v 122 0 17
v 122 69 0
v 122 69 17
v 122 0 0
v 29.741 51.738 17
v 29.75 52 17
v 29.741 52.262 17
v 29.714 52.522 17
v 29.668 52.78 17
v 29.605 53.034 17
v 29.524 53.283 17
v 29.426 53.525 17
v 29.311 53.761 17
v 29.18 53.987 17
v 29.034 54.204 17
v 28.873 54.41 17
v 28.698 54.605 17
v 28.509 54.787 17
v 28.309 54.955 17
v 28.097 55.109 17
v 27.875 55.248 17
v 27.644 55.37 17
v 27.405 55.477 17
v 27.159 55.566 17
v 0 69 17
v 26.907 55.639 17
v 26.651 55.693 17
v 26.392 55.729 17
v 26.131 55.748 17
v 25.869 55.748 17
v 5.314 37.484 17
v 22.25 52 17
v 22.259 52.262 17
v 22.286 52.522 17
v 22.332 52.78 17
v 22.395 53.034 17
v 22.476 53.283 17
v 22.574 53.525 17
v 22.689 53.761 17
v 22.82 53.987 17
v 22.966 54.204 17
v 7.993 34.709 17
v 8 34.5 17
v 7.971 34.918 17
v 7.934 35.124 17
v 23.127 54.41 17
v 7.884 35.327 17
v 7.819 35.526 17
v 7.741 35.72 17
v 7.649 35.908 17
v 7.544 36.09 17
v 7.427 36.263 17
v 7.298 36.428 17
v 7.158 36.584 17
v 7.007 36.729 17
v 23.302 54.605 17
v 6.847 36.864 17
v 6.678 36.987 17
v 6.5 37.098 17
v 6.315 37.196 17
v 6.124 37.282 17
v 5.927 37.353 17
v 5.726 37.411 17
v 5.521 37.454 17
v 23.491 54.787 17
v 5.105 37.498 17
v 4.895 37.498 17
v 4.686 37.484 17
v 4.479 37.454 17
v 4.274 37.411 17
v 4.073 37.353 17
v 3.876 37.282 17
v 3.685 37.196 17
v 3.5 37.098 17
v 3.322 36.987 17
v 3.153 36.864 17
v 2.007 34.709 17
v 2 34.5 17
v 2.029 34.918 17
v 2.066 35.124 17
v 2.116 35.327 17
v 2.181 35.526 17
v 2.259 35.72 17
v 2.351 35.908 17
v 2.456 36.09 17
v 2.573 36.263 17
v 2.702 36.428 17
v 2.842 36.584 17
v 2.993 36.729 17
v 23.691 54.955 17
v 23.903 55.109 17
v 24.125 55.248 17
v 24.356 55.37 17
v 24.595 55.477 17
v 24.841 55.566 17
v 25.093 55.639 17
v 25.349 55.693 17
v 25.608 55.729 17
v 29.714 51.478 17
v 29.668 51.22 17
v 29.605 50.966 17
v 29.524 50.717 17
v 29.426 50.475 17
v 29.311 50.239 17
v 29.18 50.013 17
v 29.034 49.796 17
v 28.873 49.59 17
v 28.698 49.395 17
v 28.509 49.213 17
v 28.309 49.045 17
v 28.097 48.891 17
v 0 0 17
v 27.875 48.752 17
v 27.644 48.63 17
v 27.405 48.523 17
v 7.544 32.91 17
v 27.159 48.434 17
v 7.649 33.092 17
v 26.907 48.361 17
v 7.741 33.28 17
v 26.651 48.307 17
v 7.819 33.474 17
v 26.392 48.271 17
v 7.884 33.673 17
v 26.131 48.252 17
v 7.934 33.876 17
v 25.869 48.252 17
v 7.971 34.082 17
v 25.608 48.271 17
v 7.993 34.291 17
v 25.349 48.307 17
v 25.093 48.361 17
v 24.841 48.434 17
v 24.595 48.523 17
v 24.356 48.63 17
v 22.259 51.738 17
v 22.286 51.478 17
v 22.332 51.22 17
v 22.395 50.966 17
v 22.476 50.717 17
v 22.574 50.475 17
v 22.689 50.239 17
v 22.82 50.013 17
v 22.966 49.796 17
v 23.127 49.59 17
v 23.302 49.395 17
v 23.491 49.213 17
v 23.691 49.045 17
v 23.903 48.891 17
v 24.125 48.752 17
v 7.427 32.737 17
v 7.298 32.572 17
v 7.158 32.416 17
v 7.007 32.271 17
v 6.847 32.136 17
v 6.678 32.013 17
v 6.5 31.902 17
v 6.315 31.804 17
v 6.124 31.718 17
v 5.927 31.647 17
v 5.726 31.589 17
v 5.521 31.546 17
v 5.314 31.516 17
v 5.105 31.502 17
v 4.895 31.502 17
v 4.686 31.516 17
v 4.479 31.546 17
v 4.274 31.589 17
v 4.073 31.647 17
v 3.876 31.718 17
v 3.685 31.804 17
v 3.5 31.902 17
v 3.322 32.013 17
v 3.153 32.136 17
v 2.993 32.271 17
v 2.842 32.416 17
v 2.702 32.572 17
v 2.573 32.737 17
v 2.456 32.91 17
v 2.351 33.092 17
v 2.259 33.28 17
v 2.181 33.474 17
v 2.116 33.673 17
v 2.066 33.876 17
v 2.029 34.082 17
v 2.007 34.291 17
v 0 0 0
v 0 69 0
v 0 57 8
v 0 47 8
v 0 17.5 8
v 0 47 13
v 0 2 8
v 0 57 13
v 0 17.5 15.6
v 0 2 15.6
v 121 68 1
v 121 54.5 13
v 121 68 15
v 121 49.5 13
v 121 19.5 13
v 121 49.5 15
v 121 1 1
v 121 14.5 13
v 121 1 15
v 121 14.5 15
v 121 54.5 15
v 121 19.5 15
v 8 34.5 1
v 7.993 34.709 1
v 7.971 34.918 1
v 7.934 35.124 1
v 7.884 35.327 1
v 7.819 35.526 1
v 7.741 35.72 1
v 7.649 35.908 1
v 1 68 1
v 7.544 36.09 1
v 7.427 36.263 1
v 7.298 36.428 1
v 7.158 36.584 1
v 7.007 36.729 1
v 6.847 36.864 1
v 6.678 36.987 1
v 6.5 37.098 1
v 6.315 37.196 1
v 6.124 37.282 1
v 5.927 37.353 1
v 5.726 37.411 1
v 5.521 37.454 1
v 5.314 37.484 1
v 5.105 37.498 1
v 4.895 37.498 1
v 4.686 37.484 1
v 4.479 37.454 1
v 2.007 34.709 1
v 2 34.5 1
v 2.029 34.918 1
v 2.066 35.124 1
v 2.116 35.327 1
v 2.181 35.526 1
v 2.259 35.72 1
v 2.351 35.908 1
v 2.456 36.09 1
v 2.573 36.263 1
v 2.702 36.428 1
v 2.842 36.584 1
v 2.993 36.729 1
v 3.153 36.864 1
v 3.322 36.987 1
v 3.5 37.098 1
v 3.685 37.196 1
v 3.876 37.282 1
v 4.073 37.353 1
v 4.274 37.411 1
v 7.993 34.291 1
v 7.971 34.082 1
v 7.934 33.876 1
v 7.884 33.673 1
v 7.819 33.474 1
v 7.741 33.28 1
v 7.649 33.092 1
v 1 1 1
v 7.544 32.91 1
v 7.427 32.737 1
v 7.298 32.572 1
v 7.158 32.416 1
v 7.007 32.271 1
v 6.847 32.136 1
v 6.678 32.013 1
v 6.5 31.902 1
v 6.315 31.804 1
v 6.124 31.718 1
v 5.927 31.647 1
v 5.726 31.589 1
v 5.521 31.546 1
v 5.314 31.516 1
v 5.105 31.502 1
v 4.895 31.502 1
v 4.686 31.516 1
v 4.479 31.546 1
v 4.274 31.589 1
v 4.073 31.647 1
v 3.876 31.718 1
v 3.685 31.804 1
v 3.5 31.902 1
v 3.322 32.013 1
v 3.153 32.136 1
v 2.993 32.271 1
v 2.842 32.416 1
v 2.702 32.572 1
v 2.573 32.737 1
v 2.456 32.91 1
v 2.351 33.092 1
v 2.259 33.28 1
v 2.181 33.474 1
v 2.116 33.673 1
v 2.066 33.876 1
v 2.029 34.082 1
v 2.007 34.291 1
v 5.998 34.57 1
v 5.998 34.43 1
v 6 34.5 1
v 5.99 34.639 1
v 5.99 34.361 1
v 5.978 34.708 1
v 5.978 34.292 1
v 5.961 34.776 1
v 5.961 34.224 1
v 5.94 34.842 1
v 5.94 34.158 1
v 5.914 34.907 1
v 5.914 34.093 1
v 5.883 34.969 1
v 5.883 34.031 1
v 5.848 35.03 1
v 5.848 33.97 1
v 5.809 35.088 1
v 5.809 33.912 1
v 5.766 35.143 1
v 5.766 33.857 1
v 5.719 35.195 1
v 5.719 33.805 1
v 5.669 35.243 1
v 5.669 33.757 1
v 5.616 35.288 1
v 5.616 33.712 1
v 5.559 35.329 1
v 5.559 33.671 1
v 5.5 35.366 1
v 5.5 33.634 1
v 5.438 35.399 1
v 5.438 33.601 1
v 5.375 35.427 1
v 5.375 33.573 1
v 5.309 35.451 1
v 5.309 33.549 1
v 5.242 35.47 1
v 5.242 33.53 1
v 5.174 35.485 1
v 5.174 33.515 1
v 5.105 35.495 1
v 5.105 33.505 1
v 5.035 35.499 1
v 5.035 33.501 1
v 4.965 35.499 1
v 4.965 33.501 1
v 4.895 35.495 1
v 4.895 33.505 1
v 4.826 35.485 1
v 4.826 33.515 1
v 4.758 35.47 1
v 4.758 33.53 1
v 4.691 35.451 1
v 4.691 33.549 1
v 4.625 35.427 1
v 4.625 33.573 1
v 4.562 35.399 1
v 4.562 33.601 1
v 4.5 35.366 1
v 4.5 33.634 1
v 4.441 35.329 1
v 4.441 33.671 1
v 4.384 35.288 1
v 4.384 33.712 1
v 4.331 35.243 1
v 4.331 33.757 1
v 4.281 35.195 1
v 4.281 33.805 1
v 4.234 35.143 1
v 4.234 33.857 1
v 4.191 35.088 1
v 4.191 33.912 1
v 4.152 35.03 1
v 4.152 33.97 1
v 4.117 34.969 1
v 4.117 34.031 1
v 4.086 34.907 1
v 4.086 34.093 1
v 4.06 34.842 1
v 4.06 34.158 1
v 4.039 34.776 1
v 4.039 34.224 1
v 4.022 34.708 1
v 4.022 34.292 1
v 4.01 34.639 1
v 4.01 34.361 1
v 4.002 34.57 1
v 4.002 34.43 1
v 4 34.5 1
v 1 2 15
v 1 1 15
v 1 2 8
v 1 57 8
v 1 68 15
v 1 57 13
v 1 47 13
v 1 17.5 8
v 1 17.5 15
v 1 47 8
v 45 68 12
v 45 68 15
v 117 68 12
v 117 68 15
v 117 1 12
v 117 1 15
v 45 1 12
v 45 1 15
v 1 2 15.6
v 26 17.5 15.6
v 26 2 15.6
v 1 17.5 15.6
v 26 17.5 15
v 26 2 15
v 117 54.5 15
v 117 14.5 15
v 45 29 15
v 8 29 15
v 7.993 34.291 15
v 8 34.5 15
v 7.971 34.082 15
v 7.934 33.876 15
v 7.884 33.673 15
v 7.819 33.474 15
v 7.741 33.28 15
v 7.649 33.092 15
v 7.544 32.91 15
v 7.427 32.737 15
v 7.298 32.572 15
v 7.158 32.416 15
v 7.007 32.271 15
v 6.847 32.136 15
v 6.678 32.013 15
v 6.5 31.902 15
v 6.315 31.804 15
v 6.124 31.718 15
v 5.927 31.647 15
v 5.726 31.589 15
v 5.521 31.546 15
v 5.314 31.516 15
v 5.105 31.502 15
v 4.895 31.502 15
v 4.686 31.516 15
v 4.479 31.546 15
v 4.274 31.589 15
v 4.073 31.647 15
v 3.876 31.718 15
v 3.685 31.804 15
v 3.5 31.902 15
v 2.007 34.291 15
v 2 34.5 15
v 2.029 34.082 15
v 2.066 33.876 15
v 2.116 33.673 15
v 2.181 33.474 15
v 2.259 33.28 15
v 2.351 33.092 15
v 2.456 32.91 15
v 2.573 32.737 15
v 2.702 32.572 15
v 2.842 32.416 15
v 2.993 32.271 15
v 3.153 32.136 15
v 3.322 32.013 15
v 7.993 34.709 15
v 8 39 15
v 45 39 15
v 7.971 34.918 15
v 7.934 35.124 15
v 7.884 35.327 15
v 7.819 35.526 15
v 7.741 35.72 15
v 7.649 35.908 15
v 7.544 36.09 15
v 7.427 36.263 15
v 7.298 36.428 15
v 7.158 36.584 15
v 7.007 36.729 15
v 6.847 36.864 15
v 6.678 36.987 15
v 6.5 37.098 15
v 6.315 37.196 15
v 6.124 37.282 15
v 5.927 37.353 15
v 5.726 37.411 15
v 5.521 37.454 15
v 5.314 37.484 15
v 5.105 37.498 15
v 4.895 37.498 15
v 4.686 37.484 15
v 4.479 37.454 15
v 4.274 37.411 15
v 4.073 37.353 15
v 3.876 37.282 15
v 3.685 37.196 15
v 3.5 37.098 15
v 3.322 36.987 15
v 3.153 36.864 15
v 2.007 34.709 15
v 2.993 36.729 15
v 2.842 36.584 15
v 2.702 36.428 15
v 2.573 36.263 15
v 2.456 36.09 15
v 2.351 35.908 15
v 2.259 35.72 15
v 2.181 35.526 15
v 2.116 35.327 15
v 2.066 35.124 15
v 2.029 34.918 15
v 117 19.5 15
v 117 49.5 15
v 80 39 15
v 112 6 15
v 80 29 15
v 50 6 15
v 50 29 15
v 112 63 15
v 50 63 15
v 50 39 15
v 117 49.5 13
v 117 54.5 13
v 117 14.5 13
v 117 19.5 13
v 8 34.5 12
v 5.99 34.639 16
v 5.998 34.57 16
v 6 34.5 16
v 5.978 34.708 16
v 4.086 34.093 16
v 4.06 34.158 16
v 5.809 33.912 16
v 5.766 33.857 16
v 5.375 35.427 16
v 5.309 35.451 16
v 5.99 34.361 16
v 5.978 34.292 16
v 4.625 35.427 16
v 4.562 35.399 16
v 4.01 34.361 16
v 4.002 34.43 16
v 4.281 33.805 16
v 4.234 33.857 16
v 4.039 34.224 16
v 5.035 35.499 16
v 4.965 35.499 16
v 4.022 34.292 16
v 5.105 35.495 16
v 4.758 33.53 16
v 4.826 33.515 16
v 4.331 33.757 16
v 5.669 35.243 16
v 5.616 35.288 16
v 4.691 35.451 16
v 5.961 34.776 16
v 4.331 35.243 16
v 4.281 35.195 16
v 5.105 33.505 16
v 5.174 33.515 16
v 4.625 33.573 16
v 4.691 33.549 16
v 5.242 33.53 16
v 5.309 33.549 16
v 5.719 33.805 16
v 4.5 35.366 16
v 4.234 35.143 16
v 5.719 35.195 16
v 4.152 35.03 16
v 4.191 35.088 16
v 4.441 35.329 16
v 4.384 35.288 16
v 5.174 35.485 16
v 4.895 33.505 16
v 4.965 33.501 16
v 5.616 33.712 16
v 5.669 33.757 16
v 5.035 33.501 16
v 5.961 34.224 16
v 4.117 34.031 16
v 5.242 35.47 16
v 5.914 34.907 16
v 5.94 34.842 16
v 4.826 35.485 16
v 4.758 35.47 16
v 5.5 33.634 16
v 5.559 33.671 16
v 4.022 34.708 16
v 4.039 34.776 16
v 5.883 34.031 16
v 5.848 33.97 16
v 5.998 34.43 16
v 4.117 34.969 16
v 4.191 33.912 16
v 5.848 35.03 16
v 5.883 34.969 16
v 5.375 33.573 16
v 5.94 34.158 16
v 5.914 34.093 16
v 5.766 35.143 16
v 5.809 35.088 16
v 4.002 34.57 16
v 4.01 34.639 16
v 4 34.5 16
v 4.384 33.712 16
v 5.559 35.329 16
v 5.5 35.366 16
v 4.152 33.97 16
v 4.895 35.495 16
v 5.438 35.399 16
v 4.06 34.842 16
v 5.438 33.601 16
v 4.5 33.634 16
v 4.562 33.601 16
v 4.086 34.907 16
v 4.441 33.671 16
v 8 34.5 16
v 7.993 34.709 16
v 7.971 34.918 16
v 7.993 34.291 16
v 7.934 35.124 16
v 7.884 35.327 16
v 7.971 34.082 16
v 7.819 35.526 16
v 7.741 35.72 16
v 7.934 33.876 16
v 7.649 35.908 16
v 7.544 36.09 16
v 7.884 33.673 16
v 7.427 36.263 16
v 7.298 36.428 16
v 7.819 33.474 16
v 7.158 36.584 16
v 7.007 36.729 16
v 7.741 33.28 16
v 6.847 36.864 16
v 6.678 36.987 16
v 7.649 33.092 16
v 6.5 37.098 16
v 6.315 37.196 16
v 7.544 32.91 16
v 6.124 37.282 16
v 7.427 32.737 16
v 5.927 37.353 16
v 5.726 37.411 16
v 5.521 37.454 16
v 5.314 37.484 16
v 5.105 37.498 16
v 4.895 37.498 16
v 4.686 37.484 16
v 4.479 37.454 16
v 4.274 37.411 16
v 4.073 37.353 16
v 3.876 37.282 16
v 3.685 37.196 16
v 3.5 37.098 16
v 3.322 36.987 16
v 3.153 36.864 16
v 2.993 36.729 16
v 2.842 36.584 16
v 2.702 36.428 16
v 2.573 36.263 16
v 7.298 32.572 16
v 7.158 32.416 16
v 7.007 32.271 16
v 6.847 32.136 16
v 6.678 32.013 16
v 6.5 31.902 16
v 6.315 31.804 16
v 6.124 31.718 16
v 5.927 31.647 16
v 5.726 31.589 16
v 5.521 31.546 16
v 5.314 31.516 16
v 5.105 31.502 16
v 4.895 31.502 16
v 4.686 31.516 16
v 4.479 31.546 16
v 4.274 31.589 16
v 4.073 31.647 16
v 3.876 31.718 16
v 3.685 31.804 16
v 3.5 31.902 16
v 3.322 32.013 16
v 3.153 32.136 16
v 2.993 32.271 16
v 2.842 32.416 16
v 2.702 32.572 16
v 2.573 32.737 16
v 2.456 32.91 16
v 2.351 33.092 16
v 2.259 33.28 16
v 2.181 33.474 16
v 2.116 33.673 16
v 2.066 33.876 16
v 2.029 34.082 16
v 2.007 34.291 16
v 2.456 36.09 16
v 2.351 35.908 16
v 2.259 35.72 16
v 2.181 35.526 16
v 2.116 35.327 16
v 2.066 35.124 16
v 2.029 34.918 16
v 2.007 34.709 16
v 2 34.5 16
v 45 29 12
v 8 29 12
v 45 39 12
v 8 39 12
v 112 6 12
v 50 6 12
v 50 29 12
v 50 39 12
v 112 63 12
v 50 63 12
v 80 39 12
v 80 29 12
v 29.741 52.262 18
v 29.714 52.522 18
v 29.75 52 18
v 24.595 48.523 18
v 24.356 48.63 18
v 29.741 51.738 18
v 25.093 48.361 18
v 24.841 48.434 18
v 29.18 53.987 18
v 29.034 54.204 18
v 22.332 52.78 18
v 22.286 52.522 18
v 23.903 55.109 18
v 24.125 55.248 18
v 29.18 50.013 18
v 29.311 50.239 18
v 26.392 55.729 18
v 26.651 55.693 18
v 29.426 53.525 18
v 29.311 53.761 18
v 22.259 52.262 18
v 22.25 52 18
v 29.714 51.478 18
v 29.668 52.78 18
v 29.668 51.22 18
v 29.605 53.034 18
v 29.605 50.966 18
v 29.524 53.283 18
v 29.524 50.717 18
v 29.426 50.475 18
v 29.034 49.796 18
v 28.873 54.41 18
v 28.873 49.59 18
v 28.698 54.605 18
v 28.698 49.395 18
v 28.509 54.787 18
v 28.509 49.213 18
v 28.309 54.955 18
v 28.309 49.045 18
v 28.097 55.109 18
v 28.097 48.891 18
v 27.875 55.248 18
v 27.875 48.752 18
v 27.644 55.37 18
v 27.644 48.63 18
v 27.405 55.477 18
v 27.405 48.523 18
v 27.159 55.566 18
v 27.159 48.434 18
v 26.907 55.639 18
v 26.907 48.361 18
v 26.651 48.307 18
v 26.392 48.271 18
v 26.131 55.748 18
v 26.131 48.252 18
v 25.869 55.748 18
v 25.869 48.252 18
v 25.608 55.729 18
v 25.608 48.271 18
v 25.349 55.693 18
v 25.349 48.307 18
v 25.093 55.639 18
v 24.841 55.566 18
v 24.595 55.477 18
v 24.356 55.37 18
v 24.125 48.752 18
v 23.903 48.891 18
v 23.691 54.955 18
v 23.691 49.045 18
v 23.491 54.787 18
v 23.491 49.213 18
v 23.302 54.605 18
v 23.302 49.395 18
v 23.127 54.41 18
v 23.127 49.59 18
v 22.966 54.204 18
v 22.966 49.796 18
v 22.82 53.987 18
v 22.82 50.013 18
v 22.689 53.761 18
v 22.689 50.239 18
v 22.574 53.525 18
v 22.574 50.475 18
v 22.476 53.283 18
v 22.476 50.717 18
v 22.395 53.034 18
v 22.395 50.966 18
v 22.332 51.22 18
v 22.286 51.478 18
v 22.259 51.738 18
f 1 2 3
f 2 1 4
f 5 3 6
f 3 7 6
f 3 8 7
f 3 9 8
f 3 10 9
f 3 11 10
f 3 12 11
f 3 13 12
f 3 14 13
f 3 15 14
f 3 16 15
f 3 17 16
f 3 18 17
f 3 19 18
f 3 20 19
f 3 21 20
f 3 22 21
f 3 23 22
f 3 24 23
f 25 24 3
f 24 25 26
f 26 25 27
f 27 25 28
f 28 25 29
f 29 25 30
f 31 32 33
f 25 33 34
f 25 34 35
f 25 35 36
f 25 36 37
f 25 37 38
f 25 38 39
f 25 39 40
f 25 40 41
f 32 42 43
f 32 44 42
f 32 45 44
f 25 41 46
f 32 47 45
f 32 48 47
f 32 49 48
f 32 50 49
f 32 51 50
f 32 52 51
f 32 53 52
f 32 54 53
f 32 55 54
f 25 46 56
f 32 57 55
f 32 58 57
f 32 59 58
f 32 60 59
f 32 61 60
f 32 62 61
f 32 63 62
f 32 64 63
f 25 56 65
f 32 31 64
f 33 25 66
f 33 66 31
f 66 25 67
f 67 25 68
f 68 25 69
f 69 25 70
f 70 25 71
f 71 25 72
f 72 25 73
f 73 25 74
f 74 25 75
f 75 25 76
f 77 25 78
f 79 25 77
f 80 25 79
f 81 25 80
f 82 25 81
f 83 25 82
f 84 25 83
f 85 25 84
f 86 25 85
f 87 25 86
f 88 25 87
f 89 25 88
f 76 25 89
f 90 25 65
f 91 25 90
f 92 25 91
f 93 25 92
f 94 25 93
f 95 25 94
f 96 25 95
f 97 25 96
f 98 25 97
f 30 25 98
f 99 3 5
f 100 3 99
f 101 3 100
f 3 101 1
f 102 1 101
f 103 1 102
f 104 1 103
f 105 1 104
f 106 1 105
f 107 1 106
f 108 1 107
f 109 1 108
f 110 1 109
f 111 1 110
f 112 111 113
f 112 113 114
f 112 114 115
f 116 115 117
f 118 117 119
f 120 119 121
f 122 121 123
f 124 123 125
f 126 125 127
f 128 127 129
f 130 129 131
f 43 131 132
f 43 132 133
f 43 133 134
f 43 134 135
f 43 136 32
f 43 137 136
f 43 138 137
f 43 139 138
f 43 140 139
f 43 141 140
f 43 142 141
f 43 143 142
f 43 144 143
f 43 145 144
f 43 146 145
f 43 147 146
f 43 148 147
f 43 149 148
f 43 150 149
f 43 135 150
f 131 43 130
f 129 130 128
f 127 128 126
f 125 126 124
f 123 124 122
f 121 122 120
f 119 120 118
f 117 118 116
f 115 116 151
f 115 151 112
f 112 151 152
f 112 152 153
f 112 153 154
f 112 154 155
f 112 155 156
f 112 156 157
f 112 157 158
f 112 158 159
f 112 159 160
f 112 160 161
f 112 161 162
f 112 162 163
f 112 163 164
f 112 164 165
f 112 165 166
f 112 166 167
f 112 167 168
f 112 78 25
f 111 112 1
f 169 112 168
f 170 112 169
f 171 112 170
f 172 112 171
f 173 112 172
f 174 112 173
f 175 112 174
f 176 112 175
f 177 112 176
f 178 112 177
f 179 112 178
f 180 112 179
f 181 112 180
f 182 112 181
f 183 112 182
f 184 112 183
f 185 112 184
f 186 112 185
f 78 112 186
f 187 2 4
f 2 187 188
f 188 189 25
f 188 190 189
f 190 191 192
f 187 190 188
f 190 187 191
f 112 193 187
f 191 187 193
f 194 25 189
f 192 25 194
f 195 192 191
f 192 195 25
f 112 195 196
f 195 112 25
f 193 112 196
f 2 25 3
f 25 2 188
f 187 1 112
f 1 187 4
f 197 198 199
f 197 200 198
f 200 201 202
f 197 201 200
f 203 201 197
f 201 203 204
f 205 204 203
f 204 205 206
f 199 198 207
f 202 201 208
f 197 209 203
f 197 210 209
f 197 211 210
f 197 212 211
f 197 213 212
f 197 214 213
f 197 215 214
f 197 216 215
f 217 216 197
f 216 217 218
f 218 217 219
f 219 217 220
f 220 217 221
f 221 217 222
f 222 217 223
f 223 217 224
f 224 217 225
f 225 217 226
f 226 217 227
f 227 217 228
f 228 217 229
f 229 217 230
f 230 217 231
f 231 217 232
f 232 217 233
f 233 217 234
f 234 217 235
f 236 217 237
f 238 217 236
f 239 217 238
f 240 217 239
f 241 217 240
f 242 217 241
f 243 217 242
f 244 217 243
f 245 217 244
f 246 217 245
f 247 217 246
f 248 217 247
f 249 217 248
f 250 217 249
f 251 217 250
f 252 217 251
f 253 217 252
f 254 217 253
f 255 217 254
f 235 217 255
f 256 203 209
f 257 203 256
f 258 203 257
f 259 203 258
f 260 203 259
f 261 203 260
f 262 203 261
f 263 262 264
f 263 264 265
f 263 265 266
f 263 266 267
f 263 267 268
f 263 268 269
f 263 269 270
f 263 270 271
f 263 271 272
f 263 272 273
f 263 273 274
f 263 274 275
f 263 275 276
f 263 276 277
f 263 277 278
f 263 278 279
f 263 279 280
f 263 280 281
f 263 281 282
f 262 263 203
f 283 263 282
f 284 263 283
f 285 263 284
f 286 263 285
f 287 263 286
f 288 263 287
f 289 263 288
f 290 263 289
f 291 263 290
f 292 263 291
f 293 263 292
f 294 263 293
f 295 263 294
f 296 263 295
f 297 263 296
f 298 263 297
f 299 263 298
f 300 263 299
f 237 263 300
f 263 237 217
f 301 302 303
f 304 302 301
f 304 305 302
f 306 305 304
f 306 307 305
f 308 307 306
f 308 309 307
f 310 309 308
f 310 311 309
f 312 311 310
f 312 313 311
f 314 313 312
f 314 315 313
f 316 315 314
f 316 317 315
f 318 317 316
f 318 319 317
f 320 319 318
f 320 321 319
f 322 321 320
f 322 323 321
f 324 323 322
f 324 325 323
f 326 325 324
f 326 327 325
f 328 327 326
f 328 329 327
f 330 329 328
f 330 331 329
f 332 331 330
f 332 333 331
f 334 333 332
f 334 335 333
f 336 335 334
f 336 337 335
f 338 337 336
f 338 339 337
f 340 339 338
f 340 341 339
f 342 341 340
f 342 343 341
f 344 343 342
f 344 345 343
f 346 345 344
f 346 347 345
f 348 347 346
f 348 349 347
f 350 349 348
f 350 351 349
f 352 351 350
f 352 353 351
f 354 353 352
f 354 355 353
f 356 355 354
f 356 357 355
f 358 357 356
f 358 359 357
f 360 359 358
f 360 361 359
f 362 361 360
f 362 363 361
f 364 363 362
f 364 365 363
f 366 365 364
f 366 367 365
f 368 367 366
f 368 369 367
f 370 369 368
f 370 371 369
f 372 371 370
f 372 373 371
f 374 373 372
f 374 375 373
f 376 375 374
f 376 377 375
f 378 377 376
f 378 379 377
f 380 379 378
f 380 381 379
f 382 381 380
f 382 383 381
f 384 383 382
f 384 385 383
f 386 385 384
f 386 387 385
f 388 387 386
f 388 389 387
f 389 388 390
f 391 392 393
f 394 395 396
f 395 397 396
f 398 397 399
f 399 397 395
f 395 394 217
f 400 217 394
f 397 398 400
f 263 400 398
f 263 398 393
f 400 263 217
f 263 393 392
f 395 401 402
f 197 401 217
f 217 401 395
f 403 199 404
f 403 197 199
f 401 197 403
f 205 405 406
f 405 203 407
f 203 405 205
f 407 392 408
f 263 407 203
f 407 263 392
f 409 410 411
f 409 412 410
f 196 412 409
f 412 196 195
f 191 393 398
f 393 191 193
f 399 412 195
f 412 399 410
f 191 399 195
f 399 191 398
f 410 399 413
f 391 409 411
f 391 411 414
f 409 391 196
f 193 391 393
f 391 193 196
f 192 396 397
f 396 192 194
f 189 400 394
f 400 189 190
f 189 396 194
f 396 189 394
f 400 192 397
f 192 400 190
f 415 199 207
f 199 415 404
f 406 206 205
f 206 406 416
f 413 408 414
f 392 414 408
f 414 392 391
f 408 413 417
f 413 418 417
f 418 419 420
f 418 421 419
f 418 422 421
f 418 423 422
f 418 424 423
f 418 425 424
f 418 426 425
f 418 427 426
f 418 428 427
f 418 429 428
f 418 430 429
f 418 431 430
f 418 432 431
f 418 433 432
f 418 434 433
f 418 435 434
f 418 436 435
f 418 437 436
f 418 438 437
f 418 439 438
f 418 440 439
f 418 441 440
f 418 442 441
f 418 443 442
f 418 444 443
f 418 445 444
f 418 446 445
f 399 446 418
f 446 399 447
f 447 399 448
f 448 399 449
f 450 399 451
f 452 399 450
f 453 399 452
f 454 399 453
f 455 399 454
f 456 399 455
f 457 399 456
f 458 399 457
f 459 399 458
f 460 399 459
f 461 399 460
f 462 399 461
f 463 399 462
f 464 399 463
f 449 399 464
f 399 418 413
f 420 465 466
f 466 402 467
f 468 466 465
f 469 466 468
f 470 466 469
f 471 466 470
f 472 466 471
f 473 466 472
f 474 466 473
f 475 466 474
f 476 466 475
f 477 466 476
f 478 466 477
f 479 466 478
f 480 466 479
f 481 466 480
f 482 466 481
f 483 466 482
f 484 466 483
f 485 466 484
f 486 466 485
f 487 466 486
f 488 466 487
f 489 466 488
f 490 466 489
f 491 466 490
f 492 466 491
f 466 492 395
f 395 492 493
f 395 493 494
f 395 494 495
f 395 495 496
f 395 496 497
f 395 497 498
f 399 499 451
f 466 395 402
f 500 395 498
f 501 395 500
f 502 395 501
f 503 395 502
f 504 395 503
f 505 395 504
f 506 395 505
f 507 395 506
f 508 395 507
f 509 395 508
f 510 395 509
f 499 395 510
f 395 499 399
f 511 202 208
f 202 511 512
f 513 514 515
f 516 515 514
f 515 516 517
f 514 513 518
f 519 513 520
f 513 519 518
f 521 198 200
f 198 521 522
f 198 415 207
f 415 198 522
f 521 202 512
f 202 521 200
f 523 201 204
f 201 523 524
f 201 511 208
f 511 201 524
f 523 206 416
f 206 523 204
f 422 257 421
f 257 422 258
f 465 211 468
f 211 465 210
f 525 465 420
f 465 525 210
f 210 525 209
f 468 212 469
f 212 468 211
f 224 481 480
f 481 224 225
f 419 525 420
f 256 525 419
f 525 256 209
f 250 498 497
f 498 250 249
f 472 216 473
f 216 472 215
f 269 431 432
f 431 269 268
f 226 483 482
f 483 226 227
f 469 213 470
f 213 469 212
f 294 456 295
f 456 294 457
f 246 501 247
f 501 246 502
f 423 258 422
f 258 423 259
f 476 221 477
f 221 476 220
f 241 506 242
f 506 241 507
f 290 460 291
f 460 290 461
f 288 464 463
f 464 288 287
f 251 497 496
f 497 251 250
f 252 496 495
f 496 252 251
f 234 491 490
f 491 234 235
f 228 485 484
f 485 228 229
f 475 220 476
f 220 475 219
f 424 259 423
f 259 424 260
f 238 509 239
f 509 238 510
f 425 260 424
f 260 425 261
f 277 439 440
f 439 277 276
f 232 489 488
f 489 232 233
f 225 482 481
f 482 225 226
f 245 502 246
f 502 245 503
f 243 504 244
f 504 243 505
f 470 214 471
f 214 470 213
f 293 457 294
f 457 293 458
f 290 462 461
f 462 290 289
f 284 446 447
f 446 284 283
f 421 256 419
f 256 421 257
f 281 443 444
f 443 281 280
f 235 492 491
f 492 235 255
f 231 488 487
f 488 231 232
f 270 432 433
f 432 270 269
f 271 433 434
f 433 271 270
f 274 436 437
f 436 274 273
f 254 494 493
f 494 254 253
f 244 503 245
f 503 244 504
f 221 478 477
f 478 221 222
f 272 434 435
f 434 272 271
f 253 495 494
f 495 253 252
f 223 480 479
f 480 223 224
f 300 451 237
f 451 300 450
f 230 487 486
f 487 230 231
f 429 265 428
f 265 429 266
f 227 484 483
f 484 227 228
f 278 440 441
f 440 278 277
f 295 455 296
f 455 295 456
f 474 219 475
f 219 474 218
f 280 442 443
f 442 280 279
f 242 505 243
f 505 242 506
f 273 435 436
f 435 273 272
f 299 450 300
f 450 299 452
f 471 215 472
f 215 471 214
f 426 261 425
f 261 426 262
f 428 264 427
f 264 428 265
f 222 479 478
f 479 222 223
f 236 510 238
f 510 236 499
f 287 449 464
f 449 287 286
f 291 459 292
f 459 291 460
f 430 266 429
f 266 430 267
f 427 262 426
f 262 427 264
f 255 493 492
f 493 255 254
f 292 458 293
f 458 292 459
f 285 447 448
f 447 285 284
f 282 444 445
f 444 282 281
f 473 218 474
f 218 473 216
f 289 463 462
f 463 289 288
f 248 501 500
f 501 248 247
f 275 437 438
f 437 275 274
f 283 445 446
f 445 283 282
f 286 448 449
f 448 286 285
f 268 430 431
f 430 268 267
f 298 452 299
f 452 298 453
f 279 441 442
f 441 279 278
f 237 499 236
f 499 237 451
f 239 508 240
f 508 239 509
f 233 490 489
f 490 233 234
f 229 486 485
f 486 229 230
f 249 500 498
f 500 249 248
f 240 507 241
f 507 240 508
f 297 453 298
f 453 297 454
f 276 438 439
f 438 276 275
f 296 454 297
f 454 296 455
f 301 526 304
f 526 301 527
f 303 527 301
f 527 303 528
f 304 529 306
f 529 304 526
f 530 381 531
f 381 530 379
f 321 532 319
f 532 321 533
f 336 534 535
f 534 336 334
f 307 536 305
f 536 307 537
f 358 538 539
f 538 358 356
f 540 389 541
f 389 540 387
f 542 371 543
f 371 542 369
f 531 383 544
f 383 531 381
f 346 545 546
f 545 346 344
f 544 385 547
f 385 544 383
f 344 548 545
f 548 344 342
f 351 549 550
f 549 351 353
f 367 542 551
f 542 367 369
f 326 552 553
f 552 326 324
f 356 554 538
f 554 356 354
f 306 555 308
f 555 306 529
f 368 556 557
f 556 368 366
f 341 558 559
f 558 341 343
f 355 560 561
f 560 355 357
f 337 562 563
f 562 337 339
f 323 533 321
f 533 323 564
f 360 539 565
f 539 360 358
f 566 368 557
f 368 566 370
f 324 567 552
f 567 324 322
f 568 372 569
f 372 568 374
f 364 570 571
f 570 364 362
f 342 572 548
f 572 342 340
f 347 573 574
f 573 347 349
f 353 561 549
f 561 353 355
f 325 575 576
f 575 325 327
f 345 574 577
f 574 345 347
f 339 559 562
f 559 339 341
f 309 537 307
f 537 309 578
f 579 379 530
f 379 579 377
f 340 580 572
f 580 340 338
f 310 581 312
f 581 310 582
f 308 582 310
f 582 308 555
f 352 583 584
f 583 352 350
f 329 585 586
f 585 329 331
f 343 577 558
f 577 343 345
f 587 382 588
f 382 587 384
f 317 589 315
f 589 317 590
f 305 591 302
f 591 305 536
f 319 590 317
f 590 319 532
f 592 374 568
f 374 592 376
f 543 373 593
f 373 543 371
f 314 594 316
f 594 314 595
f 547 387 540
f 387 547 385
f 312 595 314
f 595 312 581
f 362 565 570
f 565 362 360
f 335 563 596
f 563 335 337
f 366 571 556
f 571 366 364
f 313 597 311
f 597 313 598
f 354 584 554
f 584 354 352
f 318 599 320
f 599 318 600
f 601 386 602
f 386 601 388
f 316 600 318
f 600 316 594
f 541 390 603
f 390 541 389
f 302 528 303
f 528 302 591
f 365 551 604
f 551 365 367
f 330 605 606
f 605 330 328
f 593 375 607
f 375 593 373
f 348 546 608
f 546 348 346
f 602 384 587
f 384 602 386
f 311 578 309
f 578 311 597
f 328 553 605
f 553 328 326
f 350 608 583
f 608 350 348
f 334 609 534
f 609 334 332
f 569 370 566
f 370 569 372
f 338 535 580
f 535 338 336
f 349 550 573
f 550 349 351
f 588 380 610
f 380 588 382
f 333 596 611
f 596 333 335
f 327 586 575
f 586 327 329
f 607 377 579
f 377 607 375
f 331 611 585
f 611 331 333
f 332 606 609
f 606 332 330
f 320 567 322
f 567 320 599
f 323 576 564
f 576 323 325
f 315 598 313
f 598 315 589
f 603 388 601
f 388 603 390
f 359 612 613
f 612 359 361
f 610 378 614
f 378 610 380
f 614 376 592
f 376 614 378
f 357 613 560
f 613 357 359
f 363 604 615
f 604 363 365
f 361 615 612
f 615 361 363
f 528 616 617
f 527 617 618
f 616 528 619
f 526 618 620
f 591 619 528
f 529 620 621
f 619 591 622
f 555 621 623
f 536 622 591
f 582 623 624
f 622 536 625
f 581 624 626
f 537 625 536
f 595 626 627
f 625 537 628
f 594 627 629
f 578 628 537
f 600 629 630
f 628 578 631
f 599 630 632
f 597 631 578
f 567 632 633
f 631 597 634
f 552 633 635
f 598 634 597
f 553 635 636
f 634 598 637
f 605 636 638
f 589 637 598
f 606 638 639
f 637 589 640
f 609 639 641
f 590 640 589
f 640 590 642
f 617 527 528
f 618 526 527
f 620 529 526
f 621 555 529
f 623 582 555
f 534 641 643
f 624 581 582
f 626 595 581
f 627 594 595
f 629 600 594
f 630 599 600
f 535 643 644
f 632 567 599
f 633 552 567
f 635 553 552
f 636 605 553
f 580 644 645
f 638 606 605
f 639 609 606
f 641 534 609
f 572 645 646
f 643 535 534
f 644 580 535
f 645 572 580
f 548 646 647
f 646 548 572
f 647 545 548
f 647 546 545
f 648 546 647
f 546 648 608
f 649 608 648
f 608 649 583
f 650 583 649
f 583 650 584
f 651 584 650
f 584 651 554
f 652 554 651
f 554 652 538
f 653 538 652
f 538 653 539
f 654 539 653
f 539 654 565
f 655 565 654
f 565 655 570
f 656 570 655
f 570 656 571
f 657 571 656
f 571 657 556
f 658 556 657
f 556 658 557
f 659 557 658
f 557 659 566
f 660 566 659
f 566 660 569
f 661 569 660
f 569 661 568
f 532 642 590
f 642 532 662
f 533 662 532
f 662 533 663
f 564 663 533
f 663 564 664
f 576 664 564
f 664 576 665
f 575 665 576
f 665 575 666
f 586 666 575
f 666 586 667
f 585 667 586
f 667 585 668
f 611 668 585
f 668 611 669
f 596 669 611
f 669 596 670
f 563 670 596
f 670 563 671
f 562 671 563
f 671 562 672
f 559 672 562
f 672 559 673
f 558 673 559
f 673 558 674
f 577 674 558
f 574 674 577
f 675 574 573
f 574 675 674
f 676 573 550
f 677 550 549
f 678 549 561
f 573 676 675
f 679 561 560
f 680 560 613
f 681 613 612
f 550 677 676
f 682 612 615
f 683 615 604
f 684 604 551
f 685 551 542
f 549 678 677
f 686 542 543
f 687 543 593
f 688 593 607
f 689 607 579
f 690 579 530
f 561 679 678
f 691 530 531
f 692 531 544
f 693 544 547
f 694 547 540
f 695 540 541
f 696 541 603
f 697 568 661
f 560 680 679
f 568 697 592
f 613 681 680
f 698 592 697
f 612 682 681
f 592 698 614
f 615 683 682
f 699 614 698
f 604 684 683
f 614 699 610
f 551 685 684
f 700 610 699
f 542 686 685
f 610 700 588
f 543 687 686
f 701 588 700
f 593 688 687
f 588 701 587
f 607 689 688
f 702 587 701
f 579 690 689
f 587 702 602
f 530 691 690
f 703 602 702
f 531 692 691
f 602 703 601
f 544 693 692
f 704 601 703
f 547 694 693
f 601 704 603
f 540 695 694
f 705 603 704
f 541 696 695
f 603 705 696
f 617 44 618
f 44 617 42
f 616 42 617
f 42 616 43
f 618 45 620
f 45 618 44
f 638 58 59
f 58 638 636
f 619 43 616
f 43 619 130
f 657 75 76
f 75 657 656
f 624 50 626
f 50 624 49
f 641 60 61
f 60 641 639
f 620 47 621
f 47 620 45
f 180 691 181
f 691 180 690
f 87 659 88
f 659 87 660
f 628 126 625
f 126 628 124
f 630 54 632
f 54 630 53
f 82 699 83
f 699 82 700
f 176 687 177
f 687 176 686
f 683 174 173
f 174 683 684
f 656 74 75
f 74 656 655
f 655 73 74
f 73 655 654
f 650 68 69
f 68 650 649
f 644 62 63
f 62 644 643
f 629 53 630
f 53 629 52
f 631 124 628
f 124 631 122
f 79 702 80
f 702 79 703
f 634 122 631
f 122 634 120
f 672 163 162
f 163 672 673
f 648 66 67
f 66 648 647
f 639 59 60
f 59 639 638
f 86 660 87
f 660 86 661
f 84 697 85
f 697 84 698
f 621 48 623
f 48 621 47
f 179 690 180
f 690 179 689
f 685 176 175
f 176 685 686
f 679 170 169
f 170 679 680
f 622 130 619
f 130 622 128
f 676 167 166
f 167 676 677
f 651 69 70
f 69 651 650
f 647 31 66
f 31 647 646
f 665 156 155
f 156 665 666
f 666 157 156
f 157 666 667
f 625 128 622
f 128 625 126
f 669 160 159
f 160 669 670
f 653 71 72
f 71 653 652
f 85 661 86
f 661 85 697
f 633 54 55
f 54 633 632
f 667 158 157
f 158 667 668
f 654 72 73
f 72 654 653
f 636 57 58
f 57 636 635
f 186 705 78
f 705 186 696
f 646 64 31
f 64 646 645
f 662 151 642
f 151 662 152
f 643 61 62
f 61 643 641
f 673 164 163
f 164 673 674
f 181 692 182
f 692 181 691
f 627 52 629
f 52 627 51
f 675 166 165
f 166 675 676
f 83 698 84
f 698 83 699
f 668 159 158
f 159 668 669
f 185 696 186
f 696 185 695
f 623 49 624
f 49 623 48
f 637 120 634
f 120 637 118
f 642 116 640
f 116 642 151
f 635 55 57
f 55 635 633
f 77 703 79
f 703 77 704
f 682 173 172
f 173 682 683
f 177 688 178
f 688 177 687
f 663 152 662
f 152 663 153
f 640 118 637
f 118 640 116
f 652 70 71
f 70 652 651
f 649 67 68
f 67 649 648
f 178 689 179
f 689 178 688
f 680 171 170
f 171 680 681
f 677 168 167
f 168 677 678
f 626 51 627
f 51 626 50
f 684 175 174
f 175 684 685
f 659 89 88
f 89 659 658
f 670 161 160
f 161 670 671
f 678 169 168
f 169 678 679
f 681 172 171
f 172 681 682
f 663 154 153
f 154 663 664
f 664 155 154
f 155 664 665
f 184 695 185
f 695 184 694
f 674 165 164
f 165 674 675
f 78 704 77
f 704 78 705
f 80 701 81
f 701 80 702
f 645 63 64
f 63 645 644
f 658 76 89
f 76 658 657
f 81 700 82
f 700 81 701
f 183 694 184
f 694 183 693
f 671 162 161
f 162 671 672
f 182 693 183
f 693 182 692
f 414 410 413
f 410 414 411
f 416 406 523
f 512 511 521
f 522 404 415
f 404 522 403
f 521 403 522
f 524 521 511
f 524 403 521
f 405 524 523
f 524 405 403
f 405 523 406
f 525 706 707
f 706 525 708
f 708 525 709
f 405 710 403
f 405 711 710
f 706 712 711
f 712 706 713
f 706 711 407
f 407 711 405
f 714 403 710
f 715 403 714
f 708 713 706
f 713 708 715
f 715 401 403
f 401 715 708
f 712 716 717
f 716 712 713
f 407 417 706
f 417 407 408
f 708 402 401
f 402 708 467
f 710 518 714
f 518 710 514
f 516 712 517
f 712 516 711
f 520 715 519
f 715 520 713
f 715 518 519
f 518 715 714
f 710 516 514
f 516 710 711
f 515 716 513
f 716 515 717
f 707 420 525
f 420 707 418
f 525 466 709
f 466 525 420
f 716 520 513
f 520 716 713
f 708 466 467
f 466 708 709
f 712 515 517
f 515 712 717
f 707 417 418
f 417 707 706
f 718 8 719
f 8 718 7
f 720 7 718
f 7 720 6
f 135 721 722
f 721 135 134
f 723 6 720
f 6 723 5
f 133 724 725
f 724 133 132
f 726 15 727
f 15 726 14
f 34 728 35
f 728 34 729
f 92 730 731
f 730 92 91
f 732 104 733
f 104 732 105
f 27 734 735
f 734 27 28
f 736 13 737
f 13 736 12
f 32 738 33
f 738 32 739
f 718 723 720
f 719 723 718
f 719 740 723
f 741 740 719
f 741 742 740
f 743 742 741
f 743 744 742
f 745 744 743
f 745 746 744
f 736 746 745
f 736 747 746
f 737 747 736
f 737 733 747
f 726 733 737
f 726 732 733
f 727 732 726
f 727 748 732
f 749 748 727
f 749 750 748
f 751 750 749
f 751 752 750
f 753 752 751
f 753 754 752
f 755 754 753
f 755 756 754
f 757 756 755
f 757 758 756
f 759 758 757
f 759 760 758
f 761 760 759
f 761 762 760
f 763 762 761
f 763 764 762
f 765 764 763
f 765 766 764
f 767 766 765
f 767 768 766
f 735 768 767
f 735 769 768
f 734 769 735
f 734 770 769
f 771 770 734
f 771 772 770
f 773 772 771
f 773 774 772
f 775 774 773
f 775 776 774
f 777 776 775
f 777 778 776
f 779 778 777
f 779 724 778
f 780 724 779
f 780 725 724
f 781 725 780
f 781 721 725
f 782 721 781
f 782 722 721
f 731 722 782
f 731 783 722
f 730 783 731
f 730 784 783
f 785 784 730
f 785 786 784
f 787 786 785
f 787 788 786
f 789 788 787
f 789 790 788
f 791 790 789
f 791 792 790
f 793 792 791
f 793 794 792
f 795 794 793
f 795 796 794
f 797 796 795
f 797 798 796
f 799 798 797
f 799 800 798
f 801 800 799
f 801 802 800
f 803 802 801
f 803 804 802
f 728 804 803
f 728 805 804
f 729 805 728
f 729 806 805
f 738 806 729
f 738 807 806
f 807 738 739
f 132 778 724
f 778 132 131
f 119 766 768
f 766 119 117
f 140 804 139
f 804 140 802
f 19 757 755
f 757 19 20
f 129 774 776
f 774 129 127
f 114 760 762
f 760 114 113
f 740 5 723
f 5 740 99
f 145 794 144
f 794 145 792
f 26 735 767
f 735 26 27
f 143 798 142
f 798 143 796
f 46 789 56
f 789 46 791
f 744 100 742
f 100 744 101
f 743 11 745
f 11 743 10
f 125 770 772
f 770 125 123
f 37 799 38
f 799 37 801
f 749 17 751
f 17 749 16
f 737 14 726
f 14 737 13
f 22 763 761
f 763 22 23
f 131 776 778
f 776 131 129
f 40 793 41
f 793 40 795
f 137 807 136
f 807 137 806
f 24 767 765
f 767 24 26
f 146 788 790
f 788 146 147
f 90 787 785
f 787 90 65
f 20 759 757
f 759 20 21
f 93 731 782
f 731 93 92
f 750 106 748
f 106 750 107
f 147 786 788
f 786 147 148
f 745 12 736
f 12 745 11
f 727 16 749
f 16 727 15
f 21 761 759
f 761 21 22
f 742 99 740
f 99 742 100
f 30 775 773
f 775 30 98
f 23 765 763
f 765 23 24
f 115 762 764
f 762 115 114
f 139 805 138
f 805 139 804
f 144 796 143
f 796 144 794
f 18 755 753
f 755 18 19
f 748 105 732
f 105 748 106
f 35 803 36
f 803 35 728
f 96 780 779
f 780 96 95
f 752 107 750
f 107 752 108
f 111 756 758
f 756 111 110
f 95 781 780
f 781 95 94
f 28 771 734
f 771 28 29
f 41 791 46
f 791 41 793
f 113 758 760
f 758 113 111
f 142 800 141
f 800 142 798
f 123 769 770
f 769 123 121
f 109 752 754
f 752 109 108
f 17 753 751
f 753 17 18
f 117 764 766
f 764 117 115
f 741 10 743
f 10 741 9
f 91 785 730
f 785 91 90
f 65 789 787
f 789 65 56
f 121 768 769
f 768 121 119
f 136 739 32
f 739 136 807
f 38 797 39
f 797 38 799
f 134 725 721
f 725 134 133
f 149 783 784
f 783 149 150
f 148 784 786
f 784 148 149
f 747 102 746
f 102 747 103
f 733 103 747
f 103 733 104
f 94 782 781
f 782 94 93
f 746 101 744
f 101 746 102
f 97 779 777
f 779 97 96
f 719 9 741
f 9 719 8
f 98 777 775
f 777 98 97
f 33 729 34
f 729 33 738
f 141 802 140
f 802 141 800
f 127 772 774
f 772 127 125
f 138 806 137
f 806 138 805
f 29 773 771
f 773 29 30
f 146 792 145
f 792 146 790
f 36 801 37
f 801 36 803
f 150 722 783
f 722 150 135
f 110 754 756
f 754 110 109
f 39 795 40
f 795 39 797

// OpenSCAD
battery_lengh = 110;
bettery_width = 65+2;
battery_hight = 6+1;

offset_connectors = 10;
offset_circuits = 8;

wall_thickness = 1;

// Body
difference(){
    // Shell
    cube([battery_lengh+offset_connectors+(wall_thickness*2), bettery_width+(wall_thickness*2), battery_hight+offset_circuits+(wall_thickness*2)]);

    // Hollow
    translate([wall_thickness, wall_thickness, wall_thickness]) cube([battery_lengh+offset_connectors, bettery_width, battery_hight+offset_circuits+wall_thickness+1]);

    // Battery
    translate([offset_connectors+wall_thickness,wall_thickness,wall_thickness]) color("red") cube([battery_lengh, bettery_width, battery_hight]);

    // USB
    translate([0, wall_thickness+1, battery_hight+wall_thickness]) cube([26, 15.5, 7.6]);

    // MicroUSB
    translate([0, wall_thickness+46, battery_hight+wall_thickness]) cube([31, 10, 5]);
    
    // Lock Holles
    translate([battery_lengh+offset_connectors, wall_thickness+(bettery_width/2)+15, battery_hight+offset_circuits-2]) cube([5, 5, 2]);
    translate([battery_lengh+offset_connectors, wall_thickness+(bettery_width/2)-20, battery_hight+offset_circuits-2]) cube([5, 5, 2]);
}
difference(){
    translate([wall_thickness+4, wall_thickness+(bettery_width/2), 0]) cylinder(d=6, h=battery_hight+offset_circuits, $fn=90);
    translate([wall_thickness+4, wall_thickness+(bettery_width/2), 0]) cylinder(d=2, h=battery_hight+offset_circuits, $fn=90);
}


// Lid
difference(){
    union(){
        difference(){
            translate([0, 0, battery_hight+offset_circuits+wall_thickness]) cube([battery_lengh+offset_connectors+(wall_thickness*2), bettery_width+(wall_thickness*2), wall_thickness]);
            translate([wall_thickness+4, wall_thickness+(bettery_width/2), 0]) cylinder(d=6, h=25, $fn=90);
        }
        
        difference(){
            translate([wall_thickness, wall_thickness, battery_hight+offset_circuits]) cube([battery_lengh+offset_connectors, bettery_width, wall_thickness]);
            translate([wall_thickness+4, wall_thickness+(bettery_width/2), 0]) cylinder(d=2, h=25, $fn=90);
            
        }
    }
    
    // USB
    translate([0, wall_thickness+1, battery_hight+wall_thickness]) cube([26, 15.5, 7.6]);

    // Button
    translate([21+5, wall_thickness+46+5, battery_hight+wall_thickness]) cylinder(d=8, h=10, $fn=90);
    
    // Light Guide Holle
    translate([21+10+2, wall_thickness+46-12.5+5, battery_hight+wall_thickness]) cube([2, 25, 12]);
}
// Locks
translate([battery_lengh+offset_connectors-3, wall_thickness+(bettery_width/2)+15, battery_hight+offset_circuits-2]) cube([5, 5, 2]);
translate([battery_lengh+offset_connectors-3, wall_thickness+(bettery_width/2)+15, battery_hight+offset_circuits-1]) cube([4, 5, 1]);
translate([battery_lengh+offset_connectors-3, wall_thickness+(bettery_width/2)-20, battery_hight+offset_circuits-2]) cube([5, 5, 2]);
translate([battery_lengh+offset_connectors-3, wall_thickness+(bettery_width/2)-20, battery_hight+offset_circuits-1]) cube([4, 5, 1]);
// Reinforcement
difference(){
    translate([45, wall_thickness, battery_hight+offset_circuits-wall_thickness-2]) cube([72, bettery_width, 4]);
    translate([50, wall_thickness+5, battery_hight+offset_circuits-wall_thickness-2]) cube([62, bettery_width-10, 5]);
}
translate([8, 29, battery_hight+offset_circuits-wall_thickness-2]) cube([72, 10, 4]);

// Light Guide
translate([21+10+2, wall_thickness+46-12.5+5, battery_hight+offset_circuits]) color("blue") cube([2, 25, 2]);

// Button
translate([21+5, wall_thickness+46+5, battery_hight+offset_circuits]) color("black") cylinder(d=7.5, h=3, $fn=90);
translate([21+5, wall_thickness+46+5, battery_hight+offset_circuits]) cylinder(d=9.5, h=2, $fn=90);
